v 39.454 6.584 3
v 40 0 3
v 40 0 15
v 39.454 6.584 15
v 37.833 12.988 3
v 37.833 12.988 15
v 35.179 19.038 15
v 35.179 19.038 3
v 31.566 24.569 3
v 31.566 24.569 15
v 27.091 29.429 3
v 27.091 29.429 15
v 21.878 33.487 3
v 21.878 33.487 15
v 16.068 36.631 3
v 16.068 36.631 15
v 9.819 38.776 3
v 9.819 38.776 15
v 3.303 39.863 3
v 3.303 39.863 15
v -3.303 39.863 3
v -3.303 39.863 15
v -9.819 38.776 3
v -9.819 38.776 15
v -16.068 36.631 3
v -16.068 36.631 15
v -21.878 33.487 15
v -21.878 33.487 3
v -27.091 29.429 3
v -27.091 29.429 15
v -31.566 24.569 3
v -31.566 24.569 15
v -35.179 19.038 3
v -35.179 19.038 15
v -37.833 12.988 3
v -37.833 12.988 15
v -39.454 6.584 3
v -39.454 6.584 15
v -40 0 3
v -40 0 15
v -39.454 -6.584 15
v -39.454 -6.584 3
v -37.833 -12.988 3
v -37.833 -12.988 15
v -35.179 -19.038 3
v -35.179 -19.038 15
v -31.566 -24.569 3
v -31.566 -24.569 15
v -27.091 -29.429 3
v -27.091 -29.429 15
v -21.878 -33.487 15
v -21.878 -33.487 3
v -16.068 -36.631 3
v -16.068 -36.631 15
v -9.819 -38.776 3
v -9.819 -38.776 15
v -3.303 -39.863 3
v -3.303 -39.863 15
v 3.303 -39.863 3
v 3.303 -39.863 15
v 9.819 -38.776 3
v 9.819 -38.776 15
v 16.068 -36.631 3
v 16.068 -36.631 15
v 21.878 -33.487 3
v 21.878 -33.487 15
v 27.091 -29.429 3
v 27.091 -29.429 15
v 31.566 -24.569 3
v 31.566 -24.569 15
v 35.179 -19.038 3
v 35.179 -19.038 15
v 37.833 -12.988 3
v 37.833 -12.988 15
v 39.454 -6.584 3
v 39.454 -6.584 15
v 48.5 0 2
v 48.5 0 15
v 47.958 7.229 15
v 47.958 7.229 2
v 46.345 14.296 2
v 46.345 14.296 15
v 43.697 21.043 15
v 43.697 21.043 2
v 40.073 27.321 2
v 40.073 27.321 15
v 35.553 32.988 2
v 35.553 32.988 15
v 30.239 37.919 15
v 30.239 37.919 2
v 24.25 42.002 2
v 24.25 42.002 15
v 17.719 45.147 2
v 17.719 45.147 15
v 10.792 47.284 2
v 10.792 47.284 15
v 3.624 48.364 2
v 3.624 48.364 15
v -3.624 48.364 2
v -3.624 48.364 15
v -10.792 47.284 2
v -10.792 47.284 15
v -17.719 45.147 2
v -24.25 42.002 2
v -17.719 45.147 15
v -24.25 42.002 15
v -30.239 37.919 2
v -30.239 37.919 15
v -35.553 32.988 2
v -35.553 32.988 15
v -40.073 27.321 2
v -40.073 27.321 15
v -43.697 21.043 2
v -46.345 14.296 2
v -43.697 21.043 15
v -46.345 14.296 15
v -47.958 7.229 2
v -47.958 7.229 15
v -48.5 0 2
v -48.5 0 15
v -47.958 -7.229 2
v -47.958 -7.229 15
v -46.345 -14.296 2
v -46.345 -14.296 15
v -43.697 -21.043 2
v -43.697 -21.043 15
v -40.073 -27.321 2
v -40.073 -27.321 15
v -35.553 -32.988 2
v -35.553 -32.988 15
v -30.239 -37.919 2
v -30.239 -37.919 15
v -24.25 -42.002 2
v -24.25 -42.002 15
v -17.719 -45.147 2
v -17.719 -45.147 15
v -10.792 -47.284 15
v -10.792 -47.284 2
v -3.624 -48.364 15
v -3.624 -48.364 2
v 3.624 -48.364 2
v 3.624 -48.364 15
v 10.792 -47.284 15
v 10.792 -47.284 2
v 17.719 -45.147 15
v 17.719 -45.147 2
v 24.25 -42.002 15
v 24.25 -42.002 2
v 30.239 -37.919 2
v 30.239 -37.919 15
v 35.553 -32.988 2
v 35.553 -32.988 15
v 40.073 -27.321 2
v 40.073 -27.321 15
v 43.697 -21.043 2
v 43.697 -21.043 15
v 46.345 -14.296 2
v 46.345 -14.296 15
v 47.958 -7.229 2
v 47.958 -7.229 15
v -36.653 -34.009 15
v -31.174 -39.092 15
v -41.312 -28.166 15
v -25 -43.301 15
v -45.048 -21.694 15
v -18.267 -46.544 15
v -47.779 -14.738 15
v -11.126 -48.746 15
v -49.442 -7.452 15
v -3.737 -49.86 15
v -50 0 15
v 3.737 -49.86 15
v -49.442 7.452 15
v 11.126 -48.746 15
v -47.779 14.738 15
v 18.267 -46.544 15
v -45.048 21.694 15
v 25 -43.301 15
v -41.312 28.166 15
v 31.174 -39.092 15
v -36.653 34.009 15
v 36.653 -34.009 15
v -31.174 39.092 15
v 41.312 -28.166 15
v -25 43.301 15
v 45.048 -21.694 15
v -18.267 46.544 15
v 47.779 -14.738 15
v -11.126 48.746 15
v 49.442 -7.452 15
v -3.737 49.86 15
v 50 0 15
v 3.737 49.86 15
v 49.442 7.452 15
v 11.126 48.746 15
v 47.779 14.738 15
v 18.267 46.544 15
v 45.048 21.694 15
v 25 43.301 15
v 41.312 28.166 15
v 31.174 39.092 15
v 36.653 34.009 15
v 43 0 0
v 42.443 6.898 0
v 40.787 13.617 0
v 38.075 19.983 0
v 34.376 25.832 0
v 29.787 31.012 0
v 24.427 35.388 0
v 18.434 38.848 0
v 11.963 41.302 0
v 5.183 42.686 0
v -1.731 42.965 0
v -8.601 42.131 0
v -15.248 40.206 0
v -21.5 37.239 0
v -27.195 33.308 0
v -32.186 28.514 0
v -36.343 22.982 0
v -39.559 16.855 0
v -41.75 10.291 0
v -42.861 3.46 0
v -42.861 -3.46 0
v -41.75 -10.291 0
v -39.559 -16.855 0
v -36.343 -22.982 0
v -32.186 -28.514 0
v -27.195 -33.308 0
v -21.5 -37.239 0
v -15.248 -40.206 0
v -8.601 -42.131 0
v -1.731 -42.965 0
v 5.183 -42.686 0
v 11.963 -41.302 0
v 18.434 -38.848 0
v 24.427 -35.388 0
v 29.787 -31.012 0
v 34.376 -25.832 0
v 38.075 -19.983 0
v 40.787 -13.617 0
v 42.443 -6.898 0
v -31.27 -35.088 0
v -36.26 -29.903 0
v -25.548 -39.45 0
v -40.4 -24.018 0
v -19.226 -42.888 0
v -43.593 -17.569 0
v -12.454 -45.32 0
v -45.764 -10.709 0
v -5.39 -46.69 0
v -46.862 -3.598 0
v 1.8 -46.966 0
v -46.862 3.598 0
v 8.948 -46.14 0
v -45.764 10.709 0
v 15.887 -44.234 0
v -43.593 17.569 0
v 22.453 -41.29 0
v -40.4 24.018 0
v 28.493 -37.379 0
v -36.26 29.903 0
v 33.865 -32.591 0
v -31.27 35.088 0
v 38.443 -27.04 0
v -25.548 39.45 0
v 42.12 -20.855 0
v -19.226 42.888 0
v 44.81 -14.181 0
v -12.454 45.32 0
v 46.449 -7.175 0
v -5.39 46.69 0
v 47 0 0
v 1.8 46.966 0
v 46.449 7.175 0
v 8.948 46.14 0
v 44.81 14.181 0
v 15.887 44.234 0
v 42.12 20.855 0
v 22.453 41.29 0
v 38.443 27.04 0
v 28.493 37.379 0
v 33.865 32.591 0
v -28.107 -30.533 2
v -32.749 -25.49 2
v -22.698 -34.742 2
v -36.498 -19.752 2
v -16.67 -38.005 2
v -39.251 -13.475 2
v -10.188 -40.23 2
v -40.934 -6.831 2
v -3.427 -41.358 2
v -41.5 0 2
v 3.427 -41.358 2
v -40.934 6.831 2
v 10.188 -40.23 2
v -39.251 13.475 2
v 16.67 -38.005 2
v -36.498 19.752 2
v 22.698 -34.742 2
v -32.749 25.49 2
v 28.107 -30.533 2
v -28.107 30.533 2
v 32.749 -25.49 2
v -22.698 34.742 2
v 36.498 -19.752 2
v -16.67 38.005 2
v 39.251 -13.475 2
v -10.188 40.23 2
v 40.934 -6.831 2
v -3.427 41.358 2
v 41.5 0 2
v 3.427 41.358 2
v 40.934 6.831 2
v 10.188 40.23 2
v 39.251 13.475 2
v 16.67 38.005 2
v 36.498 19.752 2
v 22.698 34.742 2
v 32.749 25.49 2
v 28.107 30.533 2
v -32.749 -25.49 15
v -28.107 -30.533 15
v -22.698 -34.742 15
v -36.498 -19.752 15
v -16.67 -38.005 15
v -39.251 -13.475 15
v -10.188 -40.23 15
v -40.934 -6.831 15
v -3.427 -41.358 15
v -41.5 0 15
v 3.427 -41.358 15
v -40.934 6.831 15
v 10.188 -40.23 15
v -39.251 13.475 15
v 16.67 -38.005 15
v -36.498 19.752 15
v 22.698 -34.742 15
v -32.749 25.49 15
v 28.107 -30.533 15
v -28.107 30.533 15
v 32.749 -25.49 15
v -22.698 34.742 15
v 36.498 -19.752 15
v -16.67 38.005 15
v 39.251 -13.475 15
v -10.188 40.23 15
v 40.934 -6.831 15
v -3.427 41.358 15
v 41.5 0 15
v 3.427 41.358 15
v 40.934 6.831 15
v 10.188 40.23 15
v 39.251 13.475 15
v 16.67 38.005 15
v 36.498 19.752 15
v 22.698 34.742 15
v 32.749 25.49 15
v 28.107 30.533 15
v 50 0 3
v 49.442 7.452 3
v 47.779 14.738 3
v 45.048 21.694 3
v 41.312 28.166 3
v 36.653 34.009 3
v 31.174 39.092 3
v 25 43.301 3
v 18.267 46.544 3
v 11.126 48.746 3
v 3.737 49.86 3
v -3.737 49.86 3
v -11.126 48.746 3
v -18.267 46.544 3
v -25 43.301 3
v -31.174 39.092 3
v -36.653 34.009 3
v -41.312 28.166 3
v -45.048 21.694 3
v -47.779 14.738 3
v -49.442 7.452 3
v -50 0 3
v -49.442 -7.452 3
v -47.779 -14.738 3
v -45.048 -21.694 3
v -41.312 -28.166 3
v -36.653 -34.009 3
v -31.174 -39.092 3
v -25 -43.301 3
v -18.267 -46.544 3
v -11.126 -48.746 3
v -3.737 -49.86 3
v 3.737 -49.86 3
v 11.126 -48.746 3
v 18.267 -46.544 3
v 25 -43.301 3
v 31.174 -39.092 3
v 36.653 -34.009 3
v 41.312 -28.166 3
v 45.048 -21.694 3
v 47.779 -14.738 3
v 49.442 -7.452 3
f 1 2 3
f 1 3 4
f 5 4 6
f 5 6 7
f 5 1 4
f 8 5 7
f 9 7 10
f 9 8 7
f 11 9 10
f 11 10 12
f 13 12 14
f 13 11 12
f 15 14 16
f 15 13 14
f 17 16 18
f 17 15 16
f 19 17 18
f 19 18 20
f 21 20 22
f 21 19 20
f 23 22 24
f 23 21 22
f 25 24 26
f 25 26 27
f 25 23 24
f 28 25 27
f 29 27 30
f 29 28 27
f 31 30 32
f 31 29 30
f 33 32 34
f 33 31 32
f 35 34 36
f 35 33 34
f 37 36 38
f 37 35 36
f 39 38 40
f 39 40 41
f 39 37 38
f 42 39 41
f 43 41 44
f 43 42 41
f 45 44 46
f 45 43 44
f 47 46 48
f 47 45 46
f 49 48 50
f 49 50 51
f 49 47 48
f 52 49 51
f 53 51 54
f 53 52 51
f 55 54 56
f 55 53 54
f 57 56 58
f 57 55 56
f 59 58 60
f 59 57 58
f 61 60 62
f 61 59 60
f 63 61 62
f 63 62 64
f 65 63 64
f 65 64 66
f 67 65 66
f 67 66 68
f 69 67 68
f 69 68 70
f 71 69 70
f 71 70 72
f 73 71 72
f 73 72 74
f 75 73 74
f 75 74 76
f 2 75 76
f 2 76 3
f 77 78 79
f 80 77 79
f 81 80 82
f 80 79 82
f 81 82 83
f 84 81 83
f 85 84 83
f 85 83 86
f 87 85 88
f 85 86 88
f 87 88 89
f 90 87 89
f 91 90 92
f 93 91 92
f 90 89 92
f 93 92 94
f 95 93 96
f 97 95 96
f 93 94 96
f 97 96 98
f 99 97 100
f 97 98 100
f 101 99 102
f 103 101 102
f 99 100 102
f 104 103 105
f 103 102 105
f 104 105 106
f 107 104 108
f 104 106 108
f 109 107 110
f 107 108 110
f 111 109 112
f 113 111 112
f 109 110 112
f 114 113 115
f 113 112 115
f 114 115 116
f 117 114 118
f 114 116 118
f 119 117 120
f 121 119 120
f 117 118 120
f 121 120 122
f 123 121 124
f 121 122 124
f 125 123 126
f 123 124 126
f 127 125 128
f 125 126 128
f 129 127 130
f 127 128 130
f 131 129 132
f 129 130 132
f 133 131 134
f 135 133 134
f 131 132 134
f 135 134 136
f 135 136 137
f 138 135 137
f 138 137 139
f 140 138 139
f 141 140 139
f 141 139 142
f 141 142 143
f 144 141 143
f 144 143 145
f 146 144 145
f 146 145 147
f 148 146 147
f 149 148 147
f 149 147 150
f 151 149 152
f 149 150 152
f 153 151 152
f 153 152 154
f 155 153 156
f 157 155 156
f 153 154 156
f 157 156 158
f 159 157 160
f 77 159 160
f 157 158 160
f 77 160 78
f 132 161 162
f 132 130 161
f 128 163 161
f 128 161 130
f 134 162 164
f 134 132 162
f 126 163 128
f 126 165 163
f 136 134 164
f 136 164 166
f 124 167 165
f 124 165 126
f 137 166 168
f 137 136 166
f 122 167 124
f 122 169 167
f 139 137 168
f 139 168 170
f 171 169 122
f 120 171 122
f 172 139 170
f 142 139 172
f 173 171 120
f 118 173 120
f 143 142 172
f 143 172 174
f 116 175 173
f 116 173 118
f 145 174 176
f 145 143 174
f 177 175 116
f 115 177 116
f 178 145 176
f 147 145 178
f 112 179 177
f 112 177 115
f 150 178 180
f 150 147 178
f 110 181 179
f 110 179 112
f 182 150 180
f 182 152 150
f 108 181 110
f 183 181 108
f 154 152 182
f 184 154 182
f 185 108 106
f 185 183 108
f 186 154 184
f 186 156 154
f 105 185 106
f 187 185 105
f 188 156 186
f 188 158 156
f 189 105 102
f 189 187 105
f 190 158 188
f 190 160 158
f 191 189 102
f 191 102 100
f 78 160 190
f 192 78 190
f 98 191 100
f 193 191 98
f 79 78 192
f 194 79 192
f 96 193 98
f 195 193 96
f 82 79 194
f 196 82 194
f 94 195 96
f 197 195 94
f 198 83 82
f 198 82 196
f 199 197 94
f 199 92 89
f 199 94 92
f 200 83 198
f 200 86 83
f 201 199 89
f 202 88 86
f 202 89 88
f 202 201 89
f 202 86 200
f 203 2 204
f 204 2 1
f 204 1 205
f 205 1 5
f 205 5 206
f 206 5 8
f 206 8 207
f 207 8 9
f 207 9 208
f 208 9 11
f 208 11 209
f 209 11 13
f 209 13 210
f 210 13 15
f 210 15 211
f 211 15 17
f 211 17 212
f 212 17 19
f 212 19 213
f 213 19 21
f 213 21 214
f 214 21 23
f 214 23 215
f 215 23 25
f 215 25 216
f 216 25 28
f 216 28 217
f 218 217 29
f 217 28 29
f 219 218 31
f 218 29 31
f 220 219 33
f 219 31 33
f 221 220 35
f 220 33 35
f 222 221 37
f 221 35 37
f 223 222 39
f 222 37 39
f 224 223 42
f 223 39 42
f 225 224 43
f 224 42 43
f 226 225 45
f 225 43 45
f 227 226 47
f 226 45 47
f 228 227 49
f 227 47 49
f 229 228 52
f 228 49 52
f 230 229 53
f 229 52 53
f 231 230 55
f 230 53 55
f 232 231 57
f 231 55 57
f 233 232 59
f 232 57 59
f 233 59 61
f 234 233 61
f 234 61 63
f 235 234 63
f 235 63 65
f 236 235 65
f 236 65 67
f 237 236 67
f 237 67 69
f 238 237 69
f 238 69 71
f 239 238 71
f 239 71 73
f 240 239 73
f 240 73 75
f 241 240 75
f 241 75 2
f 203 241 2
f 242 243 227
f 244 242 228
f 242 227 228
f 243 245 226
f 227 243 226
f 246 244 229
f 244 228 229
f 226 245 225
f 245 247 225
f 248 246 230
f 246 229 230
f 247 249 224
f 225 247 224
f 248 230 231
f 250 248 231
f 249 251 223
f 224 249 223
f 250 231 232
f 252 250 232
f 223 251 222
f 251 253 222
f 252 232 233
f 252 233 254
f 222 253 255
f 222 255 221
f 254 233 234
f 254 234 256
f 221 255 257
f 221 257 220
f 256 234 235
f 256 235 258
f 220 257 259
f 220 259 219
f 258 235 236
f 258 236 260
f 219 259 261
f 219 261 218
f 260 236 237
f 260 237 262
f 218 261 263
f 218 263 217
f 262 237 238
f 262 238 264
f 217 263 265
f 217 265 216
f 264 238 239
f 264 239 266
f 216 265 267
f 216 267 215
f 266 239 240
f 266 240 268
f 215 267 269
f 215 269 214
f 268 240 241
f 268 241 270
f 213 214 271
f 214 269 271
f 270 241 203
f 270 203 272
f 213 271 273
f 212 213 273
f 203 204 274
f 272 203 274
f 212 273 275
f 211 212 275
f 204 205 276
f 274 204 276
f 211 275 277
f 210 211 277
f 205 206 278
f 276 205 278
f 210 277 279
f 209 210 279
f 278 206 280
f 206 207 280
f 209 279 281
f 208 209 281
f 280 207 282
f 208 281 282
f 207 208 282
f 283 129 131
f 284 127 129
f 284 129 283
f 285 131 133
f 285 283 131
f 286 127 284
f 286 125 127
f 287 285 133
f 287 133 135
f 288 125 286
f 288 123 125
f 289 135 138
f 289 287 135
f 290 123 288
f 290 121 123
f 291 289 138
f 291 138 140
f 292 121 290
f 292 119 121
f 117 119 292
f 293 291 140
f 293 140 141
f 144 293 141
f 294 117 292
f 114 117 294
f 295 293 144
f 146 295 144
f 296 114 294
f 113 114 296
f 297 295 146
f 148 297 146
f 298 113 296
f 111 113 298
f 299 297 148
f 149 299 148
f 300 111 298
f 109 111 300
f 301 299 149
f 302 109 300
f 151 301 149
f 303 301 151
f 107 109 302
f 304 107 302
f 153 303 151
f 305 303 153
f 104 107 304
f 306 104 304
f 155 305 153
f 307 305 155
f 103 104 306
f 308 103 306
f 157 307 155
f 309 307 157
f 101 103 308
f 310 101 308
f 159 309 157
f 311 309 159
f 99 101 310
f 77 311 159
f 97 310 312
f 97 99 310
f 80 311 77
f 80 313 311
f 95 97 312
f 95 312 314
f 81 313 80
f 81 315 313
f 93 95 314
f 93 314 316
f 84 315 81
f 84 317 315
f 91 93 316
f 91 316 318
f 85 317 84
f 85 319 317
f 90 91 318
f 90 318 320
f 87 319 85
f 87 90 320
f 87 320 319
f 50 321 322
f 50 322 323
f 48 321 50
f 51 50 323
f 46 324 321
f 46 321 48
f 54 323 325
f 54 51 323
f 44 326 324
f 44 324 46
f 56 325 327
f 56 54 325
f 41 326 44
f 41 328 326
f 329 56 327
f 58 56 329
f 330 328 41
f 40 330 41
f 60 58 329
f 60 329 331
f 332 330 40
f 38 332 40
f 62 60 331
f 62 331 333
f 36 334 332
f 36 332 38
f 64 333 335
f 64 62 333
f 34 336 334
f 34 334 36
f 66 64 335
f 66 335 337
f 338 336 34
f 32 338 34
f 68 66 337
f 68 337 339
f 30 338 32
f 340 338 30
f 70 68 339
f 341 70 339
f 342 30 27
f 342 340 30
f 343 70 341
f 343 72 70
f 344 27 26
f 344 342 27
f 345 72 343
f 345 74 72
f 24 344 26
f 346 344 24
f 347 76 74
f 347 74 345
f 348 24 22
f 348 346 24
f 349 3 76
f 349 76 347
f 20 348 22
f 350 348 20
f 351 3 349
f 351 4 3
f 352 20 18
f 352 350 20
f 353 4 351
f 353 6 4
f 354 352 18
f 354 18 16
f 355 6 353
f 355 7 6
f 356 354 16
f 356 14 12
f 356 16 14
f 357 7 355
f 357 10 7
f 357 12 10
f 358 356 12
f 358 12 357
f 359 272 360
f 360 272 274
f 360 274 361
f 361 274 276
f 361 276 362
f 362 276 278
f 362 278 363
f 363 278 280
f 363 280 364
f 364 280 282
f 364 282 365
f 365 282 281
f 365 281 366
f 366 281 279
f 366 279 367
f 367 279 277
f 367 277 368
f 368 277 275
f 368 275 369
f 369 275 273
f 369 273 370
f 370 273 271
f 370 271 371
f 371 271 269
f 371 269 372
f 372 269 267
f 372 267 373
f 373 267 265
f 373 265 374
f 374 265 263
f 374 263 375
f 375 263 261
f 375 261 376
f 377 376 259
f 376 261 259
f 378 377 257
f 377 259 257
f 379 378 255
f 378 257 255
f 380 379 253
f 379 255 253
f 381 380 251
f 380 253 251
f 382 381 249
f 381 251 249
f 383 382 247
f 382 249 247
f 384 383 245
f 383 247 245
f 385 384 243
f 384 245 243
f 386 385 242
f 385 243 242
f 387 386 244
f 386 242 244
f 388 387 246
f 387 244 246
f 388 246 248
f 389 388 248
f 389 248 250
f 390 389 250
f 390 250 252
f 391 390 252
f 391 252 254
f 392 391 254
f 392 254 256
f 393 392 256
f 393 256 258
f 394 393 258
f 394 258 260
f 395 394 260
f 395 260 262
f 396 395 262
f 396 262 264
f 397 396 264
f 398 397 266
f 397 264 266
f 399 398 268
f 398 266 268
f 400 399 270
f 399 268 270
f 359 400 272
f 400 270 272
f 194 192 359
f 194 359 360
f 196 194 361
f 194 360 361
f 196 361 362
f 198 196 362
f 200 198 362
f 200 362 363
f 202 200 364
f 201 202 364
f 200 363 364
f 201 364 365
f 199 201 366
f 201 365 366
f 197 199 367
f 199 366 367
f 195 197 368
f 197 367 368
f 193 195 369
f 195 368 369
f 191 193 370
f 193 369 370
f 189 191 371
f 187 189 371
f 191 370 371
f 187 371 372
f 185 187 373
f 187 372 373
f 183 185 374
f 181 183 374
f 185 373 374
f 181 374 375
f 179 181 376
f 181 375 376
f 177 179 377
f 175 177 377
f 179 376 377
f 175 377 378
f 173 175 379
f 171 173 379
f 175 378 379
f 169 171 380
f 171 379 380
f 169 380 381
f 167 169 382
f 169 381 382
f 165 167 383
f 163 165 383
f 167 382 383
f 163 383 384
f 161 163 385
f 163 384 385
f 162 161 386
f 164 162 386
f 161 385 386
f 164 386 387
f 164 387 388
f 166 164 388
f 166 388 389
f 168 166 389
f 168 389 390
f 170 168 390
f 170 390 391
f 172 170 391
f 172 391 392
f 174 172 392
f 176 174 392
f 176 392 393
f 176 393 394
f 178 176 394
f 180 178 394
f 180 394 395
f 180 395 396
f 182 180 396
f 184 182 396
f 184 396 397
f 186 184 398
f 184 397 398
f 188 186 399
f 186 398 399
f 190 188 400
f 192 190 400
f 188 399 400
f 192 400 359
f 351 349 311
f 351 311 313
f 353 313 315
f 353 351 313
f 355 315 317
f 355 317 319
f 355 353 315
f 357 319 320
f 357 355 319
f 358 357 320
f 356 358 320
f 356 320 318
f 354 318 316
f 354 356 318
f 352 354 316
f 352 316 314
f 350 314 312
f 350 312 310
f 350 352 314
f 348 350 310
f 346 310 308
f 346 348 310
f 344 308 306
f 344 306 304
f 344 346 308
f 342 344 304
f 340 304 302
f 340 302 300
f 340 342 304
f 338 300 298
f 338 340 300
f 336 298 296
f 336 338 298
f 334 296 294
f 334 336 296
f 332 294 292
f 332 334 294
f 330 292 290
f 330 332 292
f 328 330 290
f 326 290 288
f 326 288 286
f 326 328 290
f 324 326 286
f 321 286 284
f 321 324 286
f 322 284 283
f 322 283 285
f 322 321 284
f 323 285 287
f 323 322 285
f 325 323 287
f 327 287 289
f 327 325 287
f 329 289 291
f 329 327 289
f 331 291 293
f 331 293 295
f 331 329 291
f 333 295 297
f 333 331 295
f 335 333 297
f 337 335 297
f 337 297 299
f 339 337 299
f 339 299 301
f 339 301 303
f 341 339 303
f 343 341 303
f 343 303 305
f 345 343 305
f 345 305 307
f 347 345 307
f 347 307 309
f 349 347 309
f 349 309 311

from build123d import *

# Parameters (mm, degrees)
F0_R     = 50
F0_R_2   = 40
F1_DEPTH = 15
F2_R     = 48.5
F2_R_2   = 41.5
F3_DEPTH = 13
F4_SIZE  = 3
F5_SIZE  = 3


with BuildPart() as f1:
    # F0 (on Top) → F1 (new body)
    with BuildSketch(Plane.XY):
        Circle(F0_R)
        Circle(F0_R_2, mode=Mode.SUBTRACT)
    extrude(amount=F1_DEPTH)

    # F2 (on face) → F3 (cut)
    with BuildSketch(Plane.XY.offset(15)):
        Circle(F2_R)
        Circle(F2_R_2, mode=Mode.SUBTRACT)
    extrude(amount=-F3_DEPTH, mode=Mode.SUBTRACT)

    # F4
    f4_edges = [f1.edges().sort_by_distance(p)[0] for p in [
        (-50, 0, 0),
    ]]
    chamfer(f4_edges, length=F4_SIZE)

    # F5
    f5_edges = [f1.edges().sort_by_distance(p)[0] for p in [
        (-40, 0, 0),
    ]]
    chamfer(f5_edges, length=F5_SIZE)


solid = f1.part
